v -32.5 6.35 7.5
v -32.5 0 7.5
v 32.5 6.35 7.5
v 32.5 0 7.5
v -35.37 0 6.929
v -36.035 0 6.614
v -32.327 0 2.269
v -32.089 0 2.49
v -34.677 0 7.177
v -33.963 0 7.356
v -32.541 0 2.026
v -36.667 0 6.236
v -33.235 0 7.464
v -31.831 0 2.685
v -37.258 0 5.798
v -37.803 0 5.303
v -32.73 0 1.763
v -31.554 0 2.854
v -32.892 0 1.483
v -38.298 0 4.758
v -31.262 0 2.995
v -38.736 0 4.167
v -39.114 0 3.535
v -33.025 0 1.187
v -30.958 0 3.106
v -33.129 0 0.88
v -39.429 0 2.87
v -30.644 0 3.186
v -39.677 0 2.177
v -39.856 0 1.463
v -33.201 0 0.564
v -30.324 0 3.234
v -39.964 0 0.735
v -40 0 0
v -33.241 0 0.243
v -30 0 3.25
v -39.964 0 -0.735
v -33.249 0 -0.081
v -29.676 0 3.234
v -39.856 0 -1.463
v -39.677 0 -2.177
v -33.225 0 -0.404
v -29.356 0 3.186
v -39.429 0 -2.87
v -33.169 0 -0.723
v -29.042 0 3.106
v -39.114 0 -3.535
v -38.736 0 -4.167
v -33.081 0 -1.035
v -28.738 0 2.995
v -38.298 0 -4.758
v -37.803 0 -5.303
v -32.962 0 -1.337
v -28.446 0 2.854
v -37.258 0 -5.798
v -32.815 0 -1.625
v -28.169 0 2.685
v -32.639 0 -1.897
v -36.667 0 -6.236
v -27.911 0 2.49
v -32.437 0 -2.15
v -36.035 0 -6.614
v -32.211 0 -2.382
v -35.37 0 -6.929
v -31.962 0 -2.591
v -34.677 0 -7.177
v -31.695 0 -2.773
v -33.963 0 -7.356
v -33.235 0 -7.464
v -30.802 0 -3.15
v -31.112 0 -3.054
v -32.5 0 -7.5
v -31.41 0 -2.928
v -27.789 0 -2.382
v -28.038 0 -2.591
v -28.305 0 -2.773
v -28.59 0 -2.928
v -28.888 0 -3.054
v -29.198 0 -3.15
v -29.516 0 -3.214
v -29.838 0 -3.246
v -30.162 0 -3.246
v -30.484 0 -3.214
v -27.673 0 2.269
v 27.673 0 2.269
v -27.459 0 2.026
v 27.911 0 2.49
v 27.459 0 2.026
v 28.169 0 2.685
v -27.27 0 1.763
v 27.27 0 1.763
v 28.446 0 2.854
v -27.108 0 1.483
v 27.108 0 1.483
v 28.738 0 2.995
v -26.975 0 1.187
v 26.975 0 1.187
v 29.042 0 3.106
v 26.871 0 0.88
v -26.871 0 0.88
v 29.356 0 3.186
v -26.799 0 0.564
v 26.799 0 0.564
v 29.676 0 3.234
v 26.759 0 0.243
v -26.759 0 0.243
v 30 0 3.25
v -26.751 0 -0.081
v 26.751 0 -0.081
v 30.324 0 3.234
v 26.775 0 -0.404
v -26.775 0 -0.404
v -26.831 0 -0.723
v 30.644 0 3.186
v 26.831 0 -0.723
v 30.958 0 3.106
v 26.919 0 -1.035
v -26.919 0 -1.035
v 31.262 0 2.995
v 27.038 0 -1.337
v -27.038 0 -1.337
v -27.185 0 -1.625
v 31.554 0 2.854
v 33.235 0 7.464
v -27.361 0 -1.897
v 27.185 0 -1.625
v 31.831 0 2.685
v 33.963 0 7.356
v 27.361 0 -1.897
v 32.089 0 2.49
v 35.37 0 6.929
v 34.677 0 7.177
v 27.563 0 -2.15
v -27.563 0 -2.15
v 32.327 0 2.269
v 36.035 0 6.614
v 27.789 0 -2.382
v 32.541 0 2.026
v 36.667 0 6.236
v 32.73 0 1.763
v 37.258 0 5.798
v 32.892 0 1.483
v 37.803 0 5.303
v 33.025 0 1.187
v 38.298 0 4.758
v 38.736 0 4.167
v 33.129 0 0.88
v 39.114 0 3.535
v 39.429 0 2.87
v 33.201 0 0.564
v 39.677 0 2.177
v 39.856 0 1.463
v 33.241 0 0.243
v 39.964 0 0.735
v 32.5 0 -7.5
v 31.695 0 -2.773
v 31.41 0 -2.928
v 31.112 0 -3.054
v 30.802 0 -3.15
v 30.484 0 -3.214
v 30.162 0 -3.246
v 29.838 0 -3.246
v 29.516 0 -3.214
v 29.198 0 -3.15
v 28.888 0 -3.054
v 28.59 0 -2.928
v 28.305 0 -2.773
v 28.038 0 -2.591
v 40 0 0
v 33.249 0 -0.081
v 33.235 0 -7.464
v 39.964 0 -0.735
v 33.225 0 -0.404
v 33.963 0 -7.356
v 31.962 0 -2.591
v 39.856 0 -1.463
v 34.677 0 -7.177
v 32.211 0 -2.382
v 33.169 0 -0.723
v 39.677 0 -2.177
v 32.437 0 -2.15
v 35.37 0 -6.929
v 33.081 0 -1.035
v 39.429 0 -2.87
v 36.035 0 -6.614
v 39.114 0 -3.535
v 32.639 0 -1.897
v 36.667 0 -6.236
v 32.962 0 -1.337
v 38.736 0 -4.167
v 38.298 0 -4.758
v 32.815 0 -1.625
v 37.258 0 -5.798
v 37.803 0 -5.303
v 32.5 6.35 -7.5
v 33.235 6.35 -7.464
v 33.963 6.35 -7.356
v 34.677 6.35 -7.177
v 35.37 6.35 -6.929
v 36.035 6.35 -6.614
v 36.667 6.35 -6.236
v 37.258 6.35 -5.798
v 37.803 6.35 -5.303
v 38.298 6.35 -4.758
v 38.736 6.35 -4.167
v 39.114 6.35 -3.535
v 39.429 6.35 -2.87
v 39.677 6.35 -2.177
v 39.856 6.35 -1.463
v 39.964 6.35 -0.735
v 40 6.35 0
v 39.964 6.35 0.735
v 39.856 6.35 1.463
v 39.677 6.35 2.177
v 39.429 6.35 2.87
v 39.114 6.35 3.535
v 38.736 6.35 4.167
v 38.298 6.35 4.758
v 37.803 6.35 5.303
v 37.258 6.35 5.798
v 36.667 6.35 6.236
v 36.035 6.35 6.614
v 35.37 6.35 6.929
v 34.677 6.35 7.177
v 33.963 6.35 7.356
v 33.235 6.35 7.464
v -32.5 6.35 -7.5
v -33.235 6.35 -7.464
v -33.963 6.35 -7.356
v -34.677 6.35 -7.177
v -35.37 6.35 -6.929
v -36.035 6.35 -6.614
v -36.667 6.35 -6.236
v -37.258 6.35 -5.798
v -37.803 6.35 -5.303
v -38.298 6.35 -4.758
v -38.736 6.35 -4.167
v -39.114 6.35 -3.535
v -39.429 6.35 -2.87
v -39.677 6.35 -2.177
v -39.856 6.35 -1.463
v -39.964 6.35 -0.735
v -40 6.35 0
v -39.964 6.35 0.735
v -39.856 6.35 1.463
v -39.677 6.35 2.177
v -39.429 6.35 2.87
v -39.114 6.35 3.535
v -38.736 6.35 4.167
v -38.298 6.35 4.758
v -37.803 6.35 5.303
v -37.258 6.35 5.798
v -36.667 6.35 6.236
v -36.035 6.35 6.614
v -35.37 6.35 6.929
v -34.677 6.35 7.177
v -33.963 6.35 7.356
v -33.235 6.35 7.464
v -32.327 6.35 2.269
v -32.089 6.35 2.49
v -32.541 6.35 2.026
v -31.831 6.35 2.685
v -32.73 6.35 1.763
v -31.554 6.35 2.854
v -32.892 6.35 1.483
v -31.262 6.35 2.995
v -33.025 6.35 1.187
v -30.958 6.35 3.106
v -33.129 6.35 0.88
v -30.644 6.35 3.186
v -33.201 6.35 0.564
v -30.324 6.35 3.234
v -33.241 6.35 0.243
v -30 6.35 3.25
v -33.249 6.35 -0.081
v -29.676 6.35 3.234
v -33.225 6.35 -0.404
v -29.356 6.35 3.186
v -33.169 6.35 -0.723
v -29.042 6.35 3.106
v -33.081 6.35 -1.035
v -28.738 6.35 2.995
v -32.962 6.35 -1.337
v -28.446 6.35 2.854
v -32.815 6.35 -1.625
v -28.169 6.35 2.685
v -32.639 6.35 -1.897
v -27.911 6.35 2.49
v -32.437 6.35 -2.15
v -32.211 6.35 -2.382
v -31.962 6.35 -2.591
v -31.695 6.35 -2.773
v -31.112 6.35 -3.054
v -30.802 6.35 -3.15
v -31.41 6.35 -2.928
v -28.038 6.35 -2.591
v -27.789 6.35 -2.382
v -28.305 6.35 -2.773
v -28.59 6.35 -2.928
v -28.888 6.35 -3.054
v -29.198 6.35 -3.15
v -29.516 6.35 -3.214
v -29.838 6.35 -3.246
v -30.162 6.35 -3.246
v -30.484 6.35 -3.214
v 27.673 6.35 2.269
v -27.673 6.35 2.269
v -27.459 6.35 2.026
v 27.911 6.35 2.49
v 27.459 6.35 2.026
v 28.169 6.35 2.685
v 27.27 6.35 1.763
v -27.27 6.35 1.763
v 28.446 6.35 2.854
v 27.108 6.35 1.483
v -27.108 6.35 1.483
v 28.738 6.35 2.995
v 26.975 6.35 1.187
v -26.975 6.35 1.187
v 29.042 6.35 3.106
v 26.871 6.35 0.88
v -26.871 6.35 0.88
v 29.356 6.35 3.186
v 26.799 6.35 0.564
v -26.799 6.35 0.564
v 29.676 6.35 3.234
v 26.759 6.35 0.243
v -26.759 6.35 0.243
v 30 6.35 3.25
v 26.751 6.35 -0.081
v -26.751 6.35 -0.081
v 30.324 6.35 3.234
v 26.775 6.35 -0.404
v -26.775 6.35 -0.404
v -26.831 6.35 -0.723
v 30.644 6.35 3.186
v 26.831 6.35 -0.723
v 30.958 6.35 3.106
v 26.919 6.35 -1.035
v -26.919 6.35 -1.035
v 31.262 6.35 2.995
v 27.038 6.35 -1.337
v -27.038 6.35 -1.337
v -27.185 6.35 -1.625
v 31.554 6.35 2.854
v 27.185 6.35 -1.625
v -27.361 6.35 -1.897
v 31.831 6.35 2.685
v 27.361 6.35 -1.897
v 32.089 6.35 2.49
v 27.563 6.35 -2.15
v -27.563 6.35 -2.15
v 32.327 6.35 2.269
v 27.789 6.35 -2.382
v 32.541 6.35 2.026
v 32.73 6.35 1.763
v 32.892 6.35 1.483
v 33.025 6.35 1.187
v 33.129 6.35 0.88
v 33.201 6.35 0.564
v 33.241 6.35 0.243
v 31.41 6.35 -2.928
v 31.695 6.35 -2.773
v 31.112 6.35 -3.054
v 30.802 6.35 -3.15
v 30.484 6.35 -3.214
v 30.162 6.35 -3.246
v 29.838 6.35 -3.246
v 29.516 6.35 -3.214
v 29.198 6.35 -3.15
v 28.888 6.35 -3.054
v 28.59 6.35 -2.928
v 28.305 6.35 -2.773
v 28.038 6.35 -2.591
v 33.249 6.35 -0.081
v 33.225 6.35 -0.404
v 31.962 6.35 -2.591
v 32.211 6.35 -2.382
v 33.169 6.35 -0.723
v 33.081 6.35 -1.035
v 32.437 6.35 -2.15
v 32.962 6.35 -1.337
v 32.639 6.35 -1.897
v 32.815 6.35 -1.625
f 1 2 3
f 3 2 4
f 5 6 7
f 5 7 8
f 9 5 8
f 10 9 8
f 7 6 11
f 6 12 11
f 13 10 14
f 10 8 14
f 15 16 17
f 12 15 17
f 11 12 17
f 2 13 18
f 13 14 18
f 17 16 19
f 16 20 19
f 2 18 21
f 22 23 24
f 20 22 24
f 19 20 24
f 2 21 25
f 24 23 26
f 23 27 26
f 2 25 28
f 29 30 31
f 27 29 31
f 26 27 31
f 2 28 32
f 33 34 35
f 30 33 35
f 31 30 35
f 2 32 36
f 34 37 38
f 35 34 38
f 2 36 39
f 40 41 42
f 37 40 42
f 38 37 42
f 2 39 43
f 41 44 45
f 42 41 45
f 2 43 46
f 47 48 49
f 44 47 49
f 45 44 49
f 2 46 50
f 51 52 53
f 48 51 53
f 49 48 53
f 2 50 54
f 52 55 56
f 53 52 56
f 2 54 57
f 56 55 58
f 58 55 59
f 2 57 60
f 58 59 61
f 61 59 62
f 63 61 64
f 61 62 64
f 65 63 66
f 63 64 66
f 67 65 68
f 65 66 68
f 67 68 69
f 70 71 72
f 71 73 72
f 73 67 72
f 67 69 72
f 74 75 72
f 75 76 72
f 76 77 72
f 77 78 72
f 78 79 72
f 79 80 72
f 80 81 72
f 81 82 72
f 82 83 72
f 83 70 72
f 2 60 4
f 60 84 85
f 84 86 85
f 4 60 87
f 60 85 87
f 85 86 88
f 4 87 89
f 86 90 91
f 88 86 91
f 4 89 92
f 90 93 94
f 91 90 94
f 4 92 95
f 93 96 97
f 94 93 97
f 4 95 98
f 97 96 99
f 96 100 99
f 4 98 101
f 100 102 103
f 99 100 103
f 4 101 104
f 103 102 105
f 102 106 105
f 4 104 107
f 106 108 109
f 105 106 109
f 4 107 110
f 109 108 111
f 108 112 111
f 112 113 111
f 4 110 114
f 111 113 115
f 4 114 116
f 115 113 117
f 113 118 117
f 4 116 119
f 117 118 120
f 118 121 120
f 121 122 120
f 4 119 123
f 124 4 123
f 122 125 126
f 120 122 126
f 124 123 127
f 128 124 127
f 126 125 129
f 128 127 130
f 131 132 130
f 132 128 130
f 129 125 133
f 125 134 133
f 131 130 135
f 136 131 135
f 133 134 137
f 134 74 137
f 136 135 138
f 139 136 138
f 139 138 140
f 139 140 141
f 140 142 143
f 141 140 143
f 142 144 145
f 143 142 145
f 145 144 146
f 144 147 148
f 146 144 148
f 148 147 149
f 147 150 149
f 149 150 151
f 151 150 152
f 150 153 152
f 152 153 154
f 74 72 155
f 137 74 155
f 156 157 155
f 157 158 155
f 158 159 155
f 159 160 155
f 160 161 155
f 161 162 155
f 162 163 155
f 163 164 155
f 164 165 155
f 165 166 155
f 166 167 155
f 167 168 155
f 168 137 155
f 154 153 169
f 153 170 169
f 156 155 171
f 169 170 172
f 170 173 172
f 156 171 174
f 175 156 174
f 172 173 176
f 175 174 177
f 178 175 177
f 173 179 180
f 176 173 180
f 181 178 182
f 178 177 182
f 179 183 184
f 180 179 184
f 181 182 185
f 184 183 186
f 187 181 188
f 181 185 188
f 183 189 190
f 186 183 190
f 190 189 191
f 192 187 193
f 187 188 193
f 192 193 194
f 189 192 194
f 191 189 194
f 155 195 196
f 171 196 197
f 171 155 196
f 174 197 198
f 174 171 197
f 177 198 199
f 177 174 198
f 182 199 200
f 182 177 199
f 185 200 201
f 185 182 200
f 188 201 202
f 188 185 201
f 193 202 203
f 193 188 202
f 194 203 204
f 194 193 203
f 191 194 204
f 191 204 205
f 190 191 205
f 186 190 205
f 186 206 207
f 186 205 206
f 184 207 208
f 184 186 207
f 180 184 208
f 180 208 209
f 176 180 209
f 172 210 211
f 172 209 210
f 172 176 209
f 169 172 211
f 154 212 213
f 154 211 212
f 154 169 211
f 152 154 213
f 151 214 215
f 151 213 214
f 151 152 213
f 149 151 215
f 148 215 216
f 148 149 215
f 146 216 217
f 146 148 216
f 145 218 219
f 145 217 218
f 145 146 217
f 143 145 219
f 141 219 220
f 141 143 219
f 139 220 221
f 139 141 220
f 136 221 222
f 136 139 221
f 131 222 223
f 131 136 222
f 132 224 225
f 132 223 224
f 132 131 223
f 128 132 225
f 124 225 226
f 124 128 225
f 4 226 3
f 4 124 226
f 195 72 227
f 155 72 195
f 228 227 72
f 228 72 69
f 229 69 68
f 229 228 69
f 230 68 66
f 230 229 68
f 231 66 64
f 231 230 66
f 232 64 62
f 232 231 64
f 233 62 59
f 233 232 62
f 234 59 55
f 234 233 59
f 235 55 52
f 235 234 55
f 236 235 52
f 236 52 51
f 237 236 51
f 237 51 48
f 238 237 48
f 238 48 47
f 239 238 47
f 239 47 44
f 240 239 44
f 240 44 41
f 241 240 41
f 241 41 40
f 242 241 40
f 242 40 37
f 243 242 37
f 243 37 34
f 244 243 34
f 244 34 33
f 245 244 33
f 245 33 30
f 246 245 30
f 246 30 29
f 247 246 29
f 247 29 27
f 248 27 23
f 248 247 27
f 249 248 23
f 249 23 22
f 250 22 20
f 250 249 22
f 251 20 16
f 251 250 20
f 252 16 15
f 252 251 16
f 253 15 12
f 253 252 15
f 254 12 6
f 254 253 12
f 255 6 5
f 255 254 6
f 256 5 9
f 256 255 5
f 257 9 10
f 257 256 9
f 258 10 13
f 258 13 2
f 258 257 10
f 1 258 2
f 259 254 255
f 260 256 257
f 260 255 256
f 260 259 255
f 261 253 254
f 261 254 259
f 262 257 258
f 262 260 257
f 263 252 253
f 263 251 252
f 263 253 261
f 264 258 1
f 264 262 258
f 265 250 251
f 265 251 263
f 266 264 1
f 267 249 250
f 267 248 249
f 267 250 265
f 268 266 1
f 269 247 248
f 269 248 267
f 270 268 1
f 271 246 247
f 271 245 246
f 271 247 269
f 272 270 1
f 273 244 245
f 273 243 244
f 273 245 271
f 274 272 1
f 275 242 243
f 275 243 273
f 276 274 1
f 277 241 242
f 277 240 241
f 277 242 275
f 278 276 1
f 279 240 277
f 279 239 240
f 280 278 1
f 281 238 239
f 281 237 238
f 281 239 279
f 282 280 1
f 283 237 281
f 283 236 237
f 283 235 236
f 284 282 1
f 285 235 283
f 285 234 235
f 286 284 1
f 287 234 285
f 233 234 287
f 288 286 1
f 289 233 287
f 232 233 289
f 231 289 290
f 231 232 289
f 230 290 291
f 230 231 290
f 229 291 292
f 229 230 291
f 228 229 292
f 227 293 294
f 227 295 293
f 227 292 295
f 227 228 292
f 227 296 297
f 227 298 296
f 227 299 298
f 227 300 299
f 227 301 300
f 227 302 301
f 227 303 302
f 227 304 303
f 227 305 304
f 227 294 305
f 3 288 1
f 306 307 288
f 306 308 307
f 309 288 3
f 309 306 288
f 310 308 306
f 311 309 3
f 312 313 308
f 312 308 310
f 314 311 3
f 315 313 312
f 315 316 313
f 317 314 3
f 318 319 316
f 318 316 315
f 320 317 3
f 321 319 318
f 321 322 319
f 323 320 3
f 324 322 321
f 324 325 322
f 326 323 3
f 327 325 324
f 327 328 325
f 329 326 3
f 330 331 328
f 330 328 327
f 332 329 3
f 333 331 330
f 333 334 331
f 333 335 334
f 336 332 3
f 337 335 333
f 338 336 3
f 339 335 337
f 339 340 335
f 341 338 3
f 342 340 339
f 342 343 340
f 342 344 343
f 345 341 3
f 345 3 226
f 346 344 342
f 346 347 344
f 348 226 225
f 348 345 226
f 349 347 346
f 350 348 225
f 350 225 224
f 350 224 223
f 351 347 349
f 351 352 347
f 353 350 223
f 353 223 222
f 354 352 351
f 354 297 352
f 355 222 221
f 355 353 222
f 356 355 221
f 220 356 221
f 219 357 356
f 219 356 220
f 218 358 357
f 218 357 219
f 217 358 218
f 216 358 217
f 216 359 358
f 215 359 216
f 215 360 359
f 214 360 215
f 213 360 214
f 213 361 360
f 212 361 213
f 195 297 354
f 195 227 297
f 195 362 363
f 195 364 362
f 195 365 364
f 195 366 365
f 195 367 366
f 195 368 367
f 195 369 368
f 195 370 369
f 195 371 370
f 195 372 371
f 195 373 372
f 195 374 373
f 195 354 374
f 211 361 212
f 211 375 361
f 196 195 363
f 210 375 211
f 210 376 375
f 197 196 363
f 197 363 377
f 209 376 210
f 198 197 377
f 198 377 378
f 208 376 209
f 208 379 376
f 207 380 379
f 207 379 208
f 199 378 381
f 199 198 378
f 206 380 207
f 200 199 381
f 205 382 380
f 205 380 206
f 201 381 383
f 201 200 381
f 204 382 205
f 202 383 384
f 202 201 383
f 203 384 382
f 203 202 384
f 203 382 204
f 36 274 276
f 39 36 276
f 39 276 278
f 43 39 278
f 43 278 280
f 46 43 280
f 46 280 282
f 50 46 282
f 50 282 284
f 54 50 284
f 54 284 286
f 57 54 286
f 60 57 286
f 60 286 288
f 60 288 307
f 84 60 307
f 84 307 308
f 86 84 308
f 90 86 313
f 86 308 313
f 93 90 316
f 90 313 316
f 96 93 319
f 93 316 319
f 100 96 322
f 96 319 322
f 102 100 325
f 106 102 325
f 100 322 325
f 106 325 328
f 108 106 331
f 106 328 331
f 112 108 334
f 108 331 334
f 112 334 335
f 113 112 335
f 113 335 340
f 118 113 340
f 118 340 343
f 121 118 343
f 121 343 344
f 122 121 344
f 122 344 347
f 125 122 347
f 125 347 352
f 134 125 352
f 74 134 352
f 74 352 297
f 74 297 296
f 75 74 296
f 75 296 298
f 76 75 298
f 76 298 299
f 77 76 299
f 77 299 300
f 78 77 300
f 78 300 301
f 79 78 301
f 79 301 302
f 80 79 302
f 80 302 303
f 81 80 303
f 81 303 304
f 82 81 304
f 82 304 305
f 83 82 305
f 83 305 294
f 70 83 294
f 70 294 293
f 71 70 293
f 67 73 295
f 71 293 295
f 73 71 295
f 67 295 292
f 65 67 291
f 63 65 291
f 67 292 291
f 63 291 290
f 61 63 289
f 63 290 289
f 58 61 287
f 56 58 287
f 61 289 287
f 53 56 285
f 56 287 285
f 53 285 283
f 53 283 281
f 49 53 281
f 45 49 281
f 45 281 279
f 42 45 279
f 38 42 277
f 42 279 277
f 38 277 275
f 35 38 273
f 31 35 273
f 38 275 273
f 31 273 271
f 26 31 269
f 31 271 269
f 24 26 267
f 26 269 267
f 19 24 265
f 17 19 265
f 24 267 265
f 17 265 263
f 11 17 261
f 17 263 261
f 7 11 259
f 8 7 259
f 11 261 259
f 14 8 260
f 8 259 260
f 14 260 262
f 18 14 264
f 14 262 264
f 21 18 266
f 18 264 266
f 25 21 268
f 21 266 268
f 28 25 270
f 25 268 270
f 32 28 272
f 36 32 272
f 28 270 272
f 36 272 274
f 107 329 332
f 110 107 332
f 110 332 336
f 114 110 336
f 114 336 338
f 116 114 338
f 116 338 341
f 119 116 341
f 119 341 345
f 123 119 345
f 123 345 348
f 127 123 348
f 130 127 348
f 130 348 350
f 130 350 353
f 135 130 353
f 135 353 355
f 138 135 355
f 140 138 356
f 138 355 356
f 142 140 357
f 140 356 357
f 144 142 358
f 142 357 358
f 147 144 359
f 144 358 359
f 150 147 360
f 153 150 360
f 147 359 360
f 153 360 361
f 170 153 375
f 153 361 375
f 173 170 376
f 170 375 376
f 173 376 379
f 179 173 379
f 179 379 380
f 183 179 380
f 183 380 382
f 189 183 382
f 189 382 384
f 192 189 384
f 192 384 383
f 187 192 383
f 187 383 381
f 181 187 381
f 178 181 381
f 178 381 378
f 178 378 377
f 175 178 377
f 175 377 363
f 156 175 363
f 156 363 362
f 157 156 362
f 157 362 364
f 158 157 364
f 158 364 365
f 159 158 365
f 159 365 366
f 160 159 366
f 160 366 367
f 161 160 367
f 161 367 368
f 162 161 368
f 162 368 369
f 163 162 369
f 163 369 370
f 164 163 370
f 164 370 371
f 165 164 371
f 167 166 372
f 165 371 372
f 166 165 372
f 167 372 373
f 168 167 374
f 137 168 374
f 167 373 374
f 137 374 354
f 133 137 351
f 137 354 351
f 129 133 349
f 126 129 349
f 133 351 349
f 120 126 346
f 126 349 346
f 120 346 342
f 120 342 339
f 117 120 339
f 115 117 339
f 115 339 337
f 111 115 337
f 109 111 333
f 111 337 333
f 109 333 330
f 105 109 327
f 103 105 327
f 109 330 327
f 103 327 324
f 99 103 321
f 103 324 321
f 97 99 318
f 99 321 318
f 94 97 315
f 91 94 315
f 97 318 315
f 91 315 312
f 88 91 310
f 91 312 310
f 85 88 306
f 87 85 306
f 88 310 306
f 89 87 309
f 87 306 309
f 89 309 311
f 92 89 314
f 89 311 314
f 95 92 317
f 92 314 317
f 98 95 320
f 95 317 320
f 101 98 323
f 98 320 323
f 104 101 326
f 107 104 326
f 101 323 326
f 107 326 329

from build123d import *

# Parameters (mm, degrees)
SKETCH1_W           = 80
SKETCH1_H           = 15
BOSS_EXTRUDE1_DEPTH = 6.35
SKETCH2_R           = 3.25
CUT_EXTRUDE1_DEPTH  = 42.189470742
FILLET1_RADIUS      = 7.5
FILLET1_LENGTH      = 6.35
FILLET2_RADIUS      = 7.5
FILLET2_LENGTH      = 6.35


with BuildPart() as part:
    # Sketch1 → Boss-Extrude1 (new body)
    with BuildSketch(Plane(origin=(0, 0, 0), x_dir=(1, 0, 0), z_dir=(0, 1, 0))):
        Rectangle(SKETCH1_W, SKETCH1_H)
    extrude(amount=BOSS_EXTRUDE1_DEPTH)

    # Sketch2 → Cut-Extrude1 (cut, through all)
    with BuildSketch(Plane(origin=(0, 6.35, 0), x_dir=(1, 0, 0), z_dir=(0, 1, 0))):
        with Locations(Location((-30, 0, 0), (0, 0, 270))):
            Circle(SKETCH2_R)
        with Locations(Location((30, 0, 0), (0, 0, 270))):
            Circle(SKETCH2_R)
    extrude(amount=-CUT_EXTRUDE1_DEPTH, mode=Mode.SUBTRACT)

    # Fillet1: full round fillet: the end face becomes a half cylinder, R = half its width
    fillet1_face = Plane((-40, 3.175, 0), x_dir=(0, 1, 0), z_dir=(-1, 0, 0))  # on the end face: x along it, z out of the body
    fillet1_slab = fillet1_face.offset(-FILLET1_RADIUS / 2) * Box(FILLET1_LENGTH, 2 * FILLET1_RADIUS, FILLET1_RADIUS, mode=Mode.PRIVATE)  # the body's end, R deep
    fillet1_round = Plane((-32.5, 3.175, 0), x_dir=(-1, 0, 0), z_dir=(0, 1, 0)) * Cylinder(FILLET1_RADIUS, FILLET1_LENGTH, mode=Mode.PRIVATE)  # its axis R under the face
    add(fillet1_slab - fillet1_round, mode=Mode.SUBTRACT)

    # Fillet2: full round fillet: the end face becomes a half cylinder, R = half its width
    fillet2_face = Plane((40, 3.175, 0), x_dir=(0, -1, 0), z_dir=(1, 0, 0))  # on the end face: x along it, z out of the body
    fillet2_slab = fillet2_face.offset(-FILLET2_RADIUS / 2) * Box(FILLET2_LENGTH, 2 * FILLET2_RADIUS, FILLET2_RADIUS, mode=Mode.PRIVATE)  # the body's end, R deep
    fillet2_round = Plane((32.5, 3.175, 0), x_dir=(1, 0, 0), z_dir=(0, -1, 0)) * Cylinder(FILLET2_RADIUS, FILLET2_LENGTH, mode=Mode.PRIVATE)  # its axis R under the face
    add(fillet2_slab - fillet2_round, mode=Mode.SUBTRACT)


solid = part.part
